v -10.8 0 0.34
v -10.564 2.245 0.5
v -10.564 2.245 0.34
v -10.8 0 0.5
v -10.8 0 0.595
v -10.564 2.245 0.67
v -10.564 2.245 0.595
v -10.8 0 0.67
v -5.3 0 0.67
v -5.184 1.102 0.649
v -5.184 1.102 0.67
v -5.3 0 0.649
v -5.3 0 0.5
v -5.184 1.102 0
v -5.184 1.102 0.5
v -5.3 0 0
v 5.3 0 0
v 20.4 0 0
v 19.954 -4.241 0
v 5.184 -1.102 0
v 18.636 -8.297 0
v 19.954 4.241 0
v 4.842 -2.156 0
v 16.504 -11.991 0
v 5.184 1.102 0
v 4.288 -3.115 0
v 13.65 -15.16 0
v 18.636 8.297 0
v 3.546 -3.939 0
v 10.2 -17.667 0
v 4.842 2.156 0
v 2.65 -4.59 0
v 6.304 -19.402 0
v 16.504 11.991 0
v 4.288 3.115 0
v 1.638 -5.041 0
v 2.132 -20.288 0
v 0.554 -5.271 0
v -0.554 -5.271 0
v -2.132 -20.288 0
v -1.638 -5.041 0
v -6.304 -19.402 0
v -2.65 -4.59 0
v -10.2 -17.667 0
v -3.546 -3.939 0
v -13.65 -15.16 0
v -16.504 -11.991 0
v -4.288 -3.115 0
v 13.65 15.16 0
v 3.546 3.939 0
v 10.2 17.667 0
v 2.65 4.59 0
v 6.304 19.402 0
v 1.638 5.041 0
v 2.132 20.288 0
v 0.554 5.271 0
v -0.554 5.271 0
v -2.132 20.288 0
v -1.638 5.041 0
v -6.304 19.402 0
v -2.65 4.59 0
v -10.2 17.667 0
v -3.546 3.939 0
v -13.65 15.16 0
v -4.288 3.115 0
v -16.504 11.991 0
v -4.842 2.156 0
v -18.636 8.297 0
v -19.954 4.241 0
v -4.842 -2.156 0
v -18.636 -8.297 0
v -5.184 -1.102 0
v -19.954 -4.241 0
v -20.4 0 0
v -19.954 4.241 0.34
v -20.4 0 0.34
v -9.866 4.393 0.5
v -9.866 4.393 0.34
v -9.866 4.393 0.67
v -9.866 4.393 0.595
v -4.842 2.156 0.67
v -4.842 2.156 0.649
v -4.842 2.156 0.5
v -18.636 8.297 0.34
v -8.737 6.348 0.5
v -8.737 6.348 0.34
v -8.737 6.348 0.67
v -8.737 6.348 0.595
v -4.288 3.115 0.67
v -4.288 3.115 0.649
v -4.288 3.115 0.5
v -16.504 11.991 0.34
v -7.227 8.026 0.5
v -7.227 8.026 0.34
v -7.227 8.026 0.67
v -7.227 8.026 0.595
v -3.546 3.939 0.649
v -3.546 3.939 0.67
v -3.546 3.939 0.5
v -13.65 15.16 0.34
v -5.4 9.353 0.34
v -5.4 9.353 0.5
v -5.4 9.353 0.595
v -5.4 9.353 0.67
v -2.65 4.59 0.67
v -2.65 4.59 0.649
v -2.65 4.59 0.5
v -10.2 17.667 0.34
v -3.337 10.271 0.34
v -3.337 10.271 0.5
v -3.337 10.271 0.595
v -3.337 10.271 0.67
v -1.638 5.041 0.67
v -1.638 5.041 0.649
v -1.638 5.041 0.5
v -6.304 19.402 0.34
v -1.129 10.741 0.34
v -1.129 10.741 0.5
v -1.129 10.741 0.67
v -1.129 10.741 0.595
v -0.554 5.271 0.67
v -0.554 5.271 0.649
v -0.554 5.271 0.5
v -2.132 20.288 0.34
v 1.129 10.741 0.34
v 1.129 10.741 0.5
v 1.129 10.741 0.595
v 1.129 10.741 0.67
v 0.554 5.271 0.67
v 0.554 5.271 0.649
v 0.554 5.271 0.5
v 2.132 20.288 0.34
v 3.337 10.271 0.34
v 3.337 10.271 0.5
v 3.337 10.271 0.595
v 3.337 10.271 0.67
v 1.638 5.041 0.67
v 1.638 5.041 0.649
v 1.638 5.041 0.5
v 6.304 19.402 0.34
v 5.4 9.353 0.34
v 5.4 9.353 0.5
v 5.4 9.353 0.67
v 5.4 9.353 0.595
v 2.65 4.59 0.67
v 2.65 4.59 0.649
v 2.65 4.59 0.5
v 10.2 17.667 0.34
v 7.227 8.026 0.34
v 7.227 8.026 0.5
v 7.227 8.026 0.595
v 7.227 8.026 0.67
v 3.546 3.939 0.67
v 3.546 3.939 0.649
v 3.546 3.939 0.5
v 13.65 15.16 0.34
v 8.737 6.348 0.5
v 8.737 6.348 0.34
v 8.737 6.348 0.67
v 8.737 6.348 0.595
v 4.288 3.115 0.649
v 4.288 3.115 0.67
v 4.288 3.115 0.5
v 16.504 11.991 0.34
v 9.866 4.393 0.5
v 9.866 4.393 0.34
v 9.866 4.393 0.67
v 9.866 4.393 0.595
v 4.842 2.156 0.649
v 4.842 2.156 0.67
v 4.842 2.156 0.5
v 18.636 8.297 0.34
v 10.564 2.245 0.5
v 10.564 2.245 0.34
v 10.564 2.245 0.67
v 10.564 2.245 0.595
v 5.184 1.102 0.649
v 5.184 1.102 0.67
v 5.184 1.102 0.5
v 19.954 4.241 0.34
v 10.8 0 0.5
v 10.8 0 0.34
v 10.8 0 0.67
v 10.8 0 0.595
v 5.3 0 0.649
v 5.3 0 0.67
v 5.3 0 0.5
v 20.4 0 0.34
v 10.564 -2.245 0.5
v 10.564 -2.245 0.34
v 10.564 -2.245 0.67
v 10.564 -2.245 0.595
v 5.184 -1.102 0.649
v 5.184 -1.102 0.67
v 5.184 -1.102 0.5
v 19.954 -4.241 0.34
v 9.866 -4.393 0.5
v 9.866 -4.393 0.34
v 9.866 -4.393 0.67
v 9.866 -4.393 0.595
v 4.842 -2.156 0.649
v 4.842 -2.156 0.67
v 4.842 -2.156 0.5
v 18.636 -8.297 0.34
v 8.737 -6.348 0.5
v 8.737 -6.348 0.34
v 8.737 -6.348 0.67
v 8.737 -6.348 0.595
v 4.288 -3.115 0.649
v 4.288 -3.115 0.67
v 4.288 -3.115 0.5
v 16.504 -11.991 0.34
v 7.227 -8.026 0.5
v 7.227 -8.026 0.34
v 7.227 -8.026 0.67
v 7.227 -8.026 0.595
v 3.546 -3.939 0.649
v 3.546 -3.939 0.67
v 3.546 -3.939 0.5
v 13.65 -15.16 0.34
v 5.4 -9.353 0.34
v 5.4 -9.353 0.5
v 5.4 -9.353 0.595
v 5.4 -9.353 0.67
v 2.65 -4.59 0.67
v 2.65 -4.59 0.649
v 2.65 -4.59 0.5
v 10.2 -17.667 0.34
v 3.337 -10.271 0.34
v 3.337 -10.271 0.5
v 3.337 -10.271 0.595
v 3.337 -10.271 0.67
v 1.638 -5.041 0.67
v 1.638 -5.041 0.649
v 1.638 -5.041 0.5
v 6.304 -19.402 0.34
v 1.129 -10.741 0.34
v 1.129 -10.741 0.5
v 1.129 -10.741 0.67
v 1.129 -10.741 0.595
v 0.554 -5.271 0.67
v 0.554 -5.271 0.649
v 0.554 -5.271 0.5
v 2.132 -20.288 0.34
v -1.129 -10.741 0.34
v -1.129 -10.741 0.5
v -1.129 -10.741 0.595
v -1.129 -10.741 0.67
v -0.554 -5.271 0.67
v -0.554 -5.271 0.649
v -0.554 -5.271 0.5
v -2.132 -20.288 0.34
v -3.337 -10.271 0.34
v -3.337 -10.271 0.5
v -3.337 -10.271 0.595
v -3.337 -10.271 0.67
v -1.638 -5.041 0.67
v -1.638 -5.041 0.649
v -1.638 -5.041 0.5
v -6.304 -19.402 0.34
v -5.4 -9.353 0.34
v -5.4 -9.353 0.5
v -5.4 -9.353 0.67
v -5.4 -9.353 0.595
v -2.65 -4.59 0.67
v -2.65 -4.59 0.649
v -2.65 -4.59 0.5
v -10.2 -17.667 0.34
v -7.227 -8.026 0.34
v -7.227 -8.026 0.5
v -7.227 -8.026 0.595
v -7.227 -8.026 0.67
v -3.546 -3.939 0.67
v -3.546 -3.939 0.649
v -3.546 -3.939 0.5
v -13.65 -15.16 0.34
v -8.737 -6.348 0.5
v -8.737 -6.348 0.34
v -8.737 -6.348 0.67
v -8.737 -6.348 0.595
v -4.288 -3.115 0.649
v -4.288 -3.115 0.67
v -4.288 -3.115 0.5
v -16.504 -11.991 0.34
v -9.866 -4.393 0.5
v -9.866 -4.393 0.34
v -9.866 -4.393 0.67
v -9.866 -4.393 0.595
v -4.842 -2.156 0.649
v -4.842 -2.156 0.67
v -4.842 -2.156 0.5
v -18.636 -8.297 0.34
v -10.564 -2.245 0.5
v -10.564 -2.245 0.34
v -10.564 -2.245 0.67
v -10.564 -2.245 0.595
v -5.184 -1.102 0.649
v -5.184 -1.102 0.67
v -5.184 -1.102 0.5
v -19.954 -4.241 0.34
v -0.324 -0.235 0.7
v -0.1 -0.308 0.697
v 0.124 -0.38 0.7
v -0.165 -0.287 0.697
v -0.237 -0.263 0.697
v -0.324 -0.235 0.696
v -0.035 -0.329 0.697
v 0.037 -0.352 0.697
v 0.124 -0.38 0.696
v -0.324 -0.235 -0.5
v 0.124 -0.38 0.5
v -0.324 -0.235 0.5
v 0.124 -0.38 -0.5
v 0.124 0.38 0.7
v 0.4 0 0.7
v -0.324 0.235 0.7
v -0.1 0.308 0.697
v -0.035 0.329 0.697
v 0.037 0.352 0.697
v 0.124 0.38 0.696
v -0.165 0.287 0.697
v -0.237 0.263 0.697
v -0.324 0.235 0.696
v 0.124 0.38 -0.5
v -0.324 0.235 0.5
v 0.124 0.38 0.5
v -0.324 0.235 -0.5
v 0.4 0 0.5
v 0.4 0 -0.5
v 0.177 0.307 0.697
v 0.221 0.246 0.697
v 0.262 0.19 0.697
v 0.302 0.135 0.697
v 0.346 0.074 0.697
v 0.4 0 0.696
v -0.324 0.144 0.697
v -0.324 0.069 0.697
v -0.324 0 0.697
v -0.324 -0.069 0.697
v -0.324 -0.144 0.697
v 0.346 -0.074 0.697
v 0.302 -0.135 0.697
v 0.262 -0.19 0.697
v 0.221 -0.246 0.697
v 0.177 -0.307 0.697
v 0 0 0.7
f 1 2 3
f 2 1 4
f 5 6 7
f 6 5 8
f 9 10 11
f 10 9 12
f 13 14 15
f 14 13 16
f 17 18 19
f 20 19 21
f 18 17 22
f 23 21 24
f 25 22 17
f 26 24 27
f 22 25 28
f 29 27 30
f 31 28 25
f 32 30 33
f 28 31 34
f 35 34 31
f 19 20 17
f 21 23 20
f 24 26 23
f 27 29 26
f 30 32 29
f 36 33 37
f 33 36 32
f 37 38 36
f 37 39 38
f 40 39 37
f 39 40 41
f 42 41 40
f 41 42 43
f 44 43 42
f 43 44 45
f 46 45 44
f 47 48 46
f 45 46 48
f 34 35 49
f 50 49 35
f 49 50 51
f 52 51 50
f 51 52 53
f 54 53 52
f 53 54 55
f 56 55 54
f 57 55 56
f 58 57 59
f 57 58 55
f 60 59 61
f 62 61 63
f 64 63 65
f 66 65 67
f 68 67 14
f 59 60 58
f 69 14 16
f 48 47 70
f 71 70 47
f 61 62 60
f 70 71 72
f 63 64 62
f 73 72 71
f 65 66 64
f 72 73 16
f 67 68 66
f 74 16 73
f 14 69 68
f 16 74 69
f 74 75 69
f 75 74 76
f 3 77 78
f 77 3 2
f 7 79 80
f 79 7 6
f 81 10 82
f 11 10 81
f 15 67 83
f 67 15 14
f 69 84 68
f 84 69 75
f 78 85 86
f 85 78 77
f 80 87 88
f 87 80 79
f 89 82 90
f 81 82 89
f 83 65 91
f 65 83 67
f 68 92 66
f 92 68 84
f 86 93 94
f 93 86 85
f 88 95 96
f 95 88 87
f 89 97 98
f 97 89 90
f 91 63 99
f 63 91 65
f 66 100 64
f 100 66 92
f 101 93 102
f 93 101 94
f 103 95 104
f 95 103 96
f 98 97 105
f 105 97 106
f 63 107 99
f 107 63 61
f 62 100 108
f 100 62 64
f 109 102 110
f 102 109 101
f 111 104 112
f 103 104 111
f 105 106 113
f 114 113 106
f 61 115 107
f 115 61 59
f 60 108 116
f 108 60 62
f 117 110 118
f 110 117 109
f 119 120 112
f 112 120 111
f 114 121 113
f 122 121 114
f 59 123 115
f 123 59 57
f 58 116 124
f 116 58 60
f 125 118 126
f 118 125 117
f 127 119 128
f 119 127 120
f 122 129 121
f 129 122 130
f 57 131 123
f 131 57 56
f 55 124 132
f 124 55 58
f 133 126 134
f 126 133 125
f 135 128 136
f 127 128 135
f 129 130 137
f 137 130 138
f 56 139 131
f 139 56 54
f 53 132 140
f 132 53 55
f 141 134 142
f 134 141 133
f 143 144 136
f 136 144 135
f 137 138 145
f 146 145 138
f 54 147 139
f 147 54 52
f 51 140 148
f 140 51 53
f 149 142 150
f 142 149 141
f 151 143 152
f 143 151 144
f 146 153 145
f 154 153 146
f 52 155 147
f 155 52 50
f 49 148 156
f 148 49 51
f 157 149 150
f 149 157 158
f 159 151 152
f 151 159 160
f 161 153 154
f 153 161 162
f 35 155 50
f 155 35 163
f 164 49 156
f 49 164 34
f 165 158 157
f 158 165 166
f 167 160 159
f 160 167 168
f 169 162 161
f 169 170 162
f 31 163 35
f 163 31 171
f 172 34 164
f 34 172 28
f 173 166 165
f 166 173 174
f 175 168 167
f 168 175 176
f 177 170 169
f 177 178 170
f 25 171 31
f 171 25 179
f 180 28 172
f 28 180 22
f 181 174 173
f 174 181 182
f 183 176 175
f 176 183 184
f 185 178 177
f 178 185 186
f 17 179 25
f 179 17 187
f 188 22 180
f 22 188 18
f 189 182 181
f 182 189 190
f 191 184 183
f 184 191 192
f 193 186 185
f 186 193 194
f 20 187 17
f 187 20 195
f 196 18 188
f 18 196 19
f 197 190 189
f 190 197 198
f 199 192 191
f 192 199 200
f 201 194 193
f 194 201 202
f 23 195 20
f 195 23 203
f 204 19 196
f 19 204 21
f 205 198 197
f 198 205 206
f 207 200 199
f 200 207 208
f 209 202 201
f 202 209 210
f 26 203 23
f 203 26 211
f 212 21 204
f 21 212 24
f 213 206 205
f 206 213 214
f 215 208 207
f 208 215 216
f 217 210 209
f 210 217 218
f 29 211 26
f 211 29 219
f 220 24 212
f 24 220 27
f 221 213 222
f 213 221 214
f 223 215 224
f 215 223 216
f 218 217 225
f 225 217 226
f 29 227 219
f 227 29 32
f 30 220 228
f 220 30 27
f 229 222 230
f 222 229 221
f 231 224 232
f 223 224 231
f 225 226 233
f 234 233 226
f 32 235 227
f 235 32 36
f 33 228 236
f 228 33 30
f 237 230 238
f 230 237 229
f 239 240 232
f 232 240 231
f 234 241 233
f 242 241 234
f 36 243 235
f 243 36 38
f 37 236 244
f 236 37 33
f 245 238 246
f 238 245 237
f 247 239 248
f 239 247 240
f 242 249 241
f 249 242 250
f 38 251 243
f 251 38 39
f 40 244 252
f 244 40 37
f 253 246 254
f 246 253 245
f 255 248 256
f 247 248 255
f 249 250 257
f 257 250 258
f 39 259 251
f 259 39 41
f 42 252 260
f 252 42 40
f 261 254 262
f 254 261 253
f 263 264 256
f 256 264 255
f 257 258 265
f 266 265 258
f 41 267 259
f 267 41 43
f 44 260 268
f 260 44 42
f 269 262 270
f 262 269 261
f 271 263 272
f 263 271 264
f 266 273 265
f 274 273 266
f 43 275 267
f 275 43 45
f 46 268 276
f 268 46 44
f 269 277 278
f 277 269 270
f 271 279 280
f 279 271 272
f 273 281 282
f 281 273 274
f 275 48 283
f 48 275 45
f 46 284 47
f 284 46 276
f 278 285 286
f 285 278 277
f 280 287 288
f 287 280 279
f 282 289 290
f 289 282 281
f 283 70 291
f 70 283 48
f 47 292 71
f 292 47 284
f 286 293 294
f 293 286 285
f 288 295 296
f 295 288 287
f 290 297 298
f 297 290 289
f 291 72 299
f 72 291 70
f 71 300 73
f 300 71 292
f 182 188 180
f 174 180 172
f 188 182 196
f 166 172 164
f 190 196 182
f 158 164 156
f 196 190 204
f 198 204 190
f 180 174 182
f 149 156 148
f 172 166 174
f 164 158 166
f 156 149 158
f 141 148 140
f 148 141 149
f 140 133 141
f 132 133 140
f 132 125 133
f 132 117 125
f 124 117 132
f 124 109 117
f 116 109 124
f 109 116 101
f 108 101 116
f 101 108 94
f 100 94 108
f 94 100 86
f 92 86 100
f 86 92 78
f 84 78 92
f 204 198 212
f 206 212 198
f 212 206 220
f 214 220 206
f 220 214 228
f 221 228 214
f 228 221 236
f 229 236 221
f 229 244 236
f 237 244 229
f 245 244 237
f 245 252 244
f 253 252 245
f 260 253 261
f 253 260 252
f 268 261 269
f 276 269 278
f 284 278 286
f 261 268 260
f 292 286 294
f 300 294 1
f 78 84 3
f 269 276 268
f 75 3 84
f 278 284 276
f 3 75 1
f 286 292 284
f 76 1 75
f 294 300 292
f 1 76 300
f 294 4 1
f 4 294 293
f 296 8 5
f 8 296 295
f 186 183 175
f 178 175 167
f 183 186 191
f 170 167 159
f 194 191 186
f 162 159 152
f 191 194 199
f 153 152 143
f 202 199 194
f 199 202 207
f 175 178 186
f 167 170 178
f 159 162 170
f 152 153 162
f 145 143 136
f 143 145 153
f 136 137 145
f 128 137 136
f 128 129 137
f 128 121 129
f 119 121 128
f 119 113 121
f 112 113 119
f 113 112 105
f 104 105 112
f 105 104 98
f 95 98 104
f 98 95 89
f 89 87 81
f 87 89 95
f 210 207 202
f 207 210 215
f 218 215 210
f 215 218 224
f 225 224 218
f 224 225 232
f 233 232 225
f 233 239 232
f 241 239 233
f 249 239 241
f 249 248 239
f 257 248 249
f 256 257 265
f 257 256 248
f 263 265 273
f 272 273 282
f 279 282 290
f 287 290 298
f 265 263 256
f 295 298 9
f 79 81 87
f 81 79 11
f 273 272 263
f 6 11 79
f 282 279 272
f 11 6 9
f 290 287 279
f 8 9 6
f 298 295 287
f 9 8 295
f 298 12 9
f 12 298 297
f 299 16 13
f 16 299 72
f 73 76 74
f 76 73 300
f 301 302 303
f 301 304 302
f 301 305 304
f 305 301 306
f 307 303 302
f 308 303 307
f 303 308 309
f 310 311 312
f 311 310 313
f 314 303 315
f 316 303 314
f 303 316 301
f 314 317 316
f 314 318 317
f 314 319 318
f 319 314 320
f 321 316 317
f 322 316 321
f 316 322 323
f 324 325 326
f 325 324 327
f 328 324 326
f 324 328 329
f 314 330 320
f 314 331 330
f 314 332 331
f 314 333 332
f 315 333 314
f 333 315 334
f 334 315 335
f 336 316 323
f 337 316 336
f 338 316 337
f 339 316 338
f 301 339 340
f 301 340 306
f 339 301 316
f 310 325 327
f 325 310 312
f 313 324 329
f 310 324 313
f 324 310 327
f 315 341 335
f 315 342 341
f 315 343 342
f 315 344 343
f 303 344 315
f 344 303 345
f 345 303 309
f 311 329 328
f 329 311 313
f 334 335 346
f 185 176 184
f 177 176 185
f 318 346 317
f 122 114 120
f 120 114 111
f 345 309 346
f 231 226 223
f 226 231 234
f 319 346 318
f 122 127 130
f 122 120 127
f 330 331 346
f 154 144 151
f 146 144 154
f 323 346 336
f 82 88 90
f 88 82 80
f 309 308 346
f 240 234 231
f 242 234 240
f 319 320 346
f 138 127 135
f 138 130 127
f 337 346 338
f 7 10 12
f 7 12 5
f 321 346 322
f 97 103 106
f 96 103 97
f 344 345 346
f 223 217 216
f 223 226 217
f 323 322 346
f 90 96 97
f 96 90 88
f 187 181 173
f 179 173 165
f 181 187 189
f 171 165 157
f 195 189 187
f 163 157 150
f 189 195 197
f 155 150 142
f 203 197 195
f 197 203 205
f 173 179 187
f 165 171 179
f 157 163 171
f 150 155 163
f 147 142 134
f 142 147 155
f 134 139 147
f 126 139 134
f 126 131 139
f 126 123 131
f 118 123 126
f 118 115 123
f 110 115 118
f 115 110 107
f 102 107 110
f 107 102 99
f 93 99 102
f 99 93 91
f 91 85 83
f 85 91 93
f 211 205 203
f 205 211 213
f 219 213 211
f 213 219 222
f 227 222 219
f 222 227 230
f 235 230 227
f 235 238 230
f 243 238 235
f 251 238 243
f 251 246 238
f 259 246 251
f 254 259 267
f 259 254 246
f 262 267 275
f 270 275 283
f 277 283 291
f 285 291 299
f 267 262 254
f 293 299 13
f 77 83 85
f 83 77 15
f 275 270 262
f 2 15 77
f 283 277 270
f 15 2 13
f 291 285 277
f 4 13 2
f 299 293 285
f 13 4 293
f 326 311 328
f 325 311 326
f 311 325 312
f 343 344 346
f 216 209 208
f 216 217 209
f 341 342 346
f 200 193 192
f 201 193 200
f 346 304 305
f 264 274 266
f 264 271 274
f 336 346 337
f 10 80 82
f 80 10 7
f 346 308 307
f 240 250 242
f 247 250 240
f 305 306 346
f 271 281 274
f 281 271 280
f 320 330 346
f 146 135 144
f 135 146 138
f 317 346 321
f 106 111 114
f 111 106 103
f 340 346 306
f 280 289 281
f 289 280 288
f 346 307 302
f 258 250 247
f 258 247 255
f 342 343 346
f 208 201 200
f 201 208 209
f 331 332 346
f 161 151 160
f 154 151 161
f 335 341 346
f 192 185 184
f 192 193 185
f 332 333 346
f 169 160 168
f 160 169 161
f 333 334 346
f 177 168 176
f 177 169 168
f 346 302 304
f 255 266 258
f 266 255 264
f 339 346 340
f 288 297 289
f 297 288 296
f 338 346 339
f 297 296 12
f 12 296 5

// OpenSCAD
// Parameters
r1 = 20.4; //[10.2:40.8:0.1]
r2 = 10.8; //[5.4:21.6:0.1]
r3 = 5.3; //[2.65:10.6:0.1]
thickness = 1; //[0.5:2:0.1]
revolve_angle = 360; //[90:360:1]
step1_h = 0.34; //[0.17:0.68:0.01]
step2_h = 0.33; //[0.165:0.66:0.01]
step3_h = 0.33; //[0.165:0.66:0.01]
axis_radius = 0.4; //[0.2:1:0.05]
axis_height_factor = 1.2; //[1:2:0.05]
fillet_radius = 0.2; //[0.1:0.6:0.05]
chamfer_amount = 0.2; //[0.1:0.6:0.05]
connect_overlap = 0.8; //[0.5:2:0.1]

// Base Shapes
module radial_profile() {
  polygon(points=[
    [r3, 0],
    [r1, 0],
    [r1, thickness * step1_h],
    [r2, thickness * step1_h],
    [r2, thickness * (step1_h + step2_h)],
    [r3, thickness * (step1_h + step2_h)],
    [r3, thickness],
    [r3, 0]
  ]);
}

module center_axis_reference() {
  translate([0, 0, thickness / 2 - connect_overlap / 2])
    cylinder(r=axis_radius, h=thickness * axis_height_factor, center=true);
}

module fillets() {
  sphere(r=fillet_radius, center=true);
}

module chamfers_top_cone() {
  translate([0, 0, thickness / 2 + chamfer_amount / 2])
    cylinder(r1=r1 + chamfer_amount, r2=0, h=chamfer_amount, center=true);
}

module chamfers_bottom_cone() {
  translate([0, 0, -thickness / 2 - chamfer_amount / 2])
    cylinder(r1=r1 + chamfer_amount, r2=0, h=chamfer_amount, center=true);
}

// Operations
module revolved_main_body() {
  rotate_extrude(angle=revolve_angle)
    radial_profile();
}

module main_with_axis() {
  union() {
    revolved_main_body();
    center_axis_reference();
  }
}

module main_with_chamfers() {
  difference() {
    main_with_axis();
    chamfers_top_cone();
    chamfers_bottom_cone();
  }
}

module main_with_fillets() {
  // Minkowski is avoided due to performance issues, so fillets are omitted
  main_with_chamfers();
}

// Final Output
main_with_fillets();
